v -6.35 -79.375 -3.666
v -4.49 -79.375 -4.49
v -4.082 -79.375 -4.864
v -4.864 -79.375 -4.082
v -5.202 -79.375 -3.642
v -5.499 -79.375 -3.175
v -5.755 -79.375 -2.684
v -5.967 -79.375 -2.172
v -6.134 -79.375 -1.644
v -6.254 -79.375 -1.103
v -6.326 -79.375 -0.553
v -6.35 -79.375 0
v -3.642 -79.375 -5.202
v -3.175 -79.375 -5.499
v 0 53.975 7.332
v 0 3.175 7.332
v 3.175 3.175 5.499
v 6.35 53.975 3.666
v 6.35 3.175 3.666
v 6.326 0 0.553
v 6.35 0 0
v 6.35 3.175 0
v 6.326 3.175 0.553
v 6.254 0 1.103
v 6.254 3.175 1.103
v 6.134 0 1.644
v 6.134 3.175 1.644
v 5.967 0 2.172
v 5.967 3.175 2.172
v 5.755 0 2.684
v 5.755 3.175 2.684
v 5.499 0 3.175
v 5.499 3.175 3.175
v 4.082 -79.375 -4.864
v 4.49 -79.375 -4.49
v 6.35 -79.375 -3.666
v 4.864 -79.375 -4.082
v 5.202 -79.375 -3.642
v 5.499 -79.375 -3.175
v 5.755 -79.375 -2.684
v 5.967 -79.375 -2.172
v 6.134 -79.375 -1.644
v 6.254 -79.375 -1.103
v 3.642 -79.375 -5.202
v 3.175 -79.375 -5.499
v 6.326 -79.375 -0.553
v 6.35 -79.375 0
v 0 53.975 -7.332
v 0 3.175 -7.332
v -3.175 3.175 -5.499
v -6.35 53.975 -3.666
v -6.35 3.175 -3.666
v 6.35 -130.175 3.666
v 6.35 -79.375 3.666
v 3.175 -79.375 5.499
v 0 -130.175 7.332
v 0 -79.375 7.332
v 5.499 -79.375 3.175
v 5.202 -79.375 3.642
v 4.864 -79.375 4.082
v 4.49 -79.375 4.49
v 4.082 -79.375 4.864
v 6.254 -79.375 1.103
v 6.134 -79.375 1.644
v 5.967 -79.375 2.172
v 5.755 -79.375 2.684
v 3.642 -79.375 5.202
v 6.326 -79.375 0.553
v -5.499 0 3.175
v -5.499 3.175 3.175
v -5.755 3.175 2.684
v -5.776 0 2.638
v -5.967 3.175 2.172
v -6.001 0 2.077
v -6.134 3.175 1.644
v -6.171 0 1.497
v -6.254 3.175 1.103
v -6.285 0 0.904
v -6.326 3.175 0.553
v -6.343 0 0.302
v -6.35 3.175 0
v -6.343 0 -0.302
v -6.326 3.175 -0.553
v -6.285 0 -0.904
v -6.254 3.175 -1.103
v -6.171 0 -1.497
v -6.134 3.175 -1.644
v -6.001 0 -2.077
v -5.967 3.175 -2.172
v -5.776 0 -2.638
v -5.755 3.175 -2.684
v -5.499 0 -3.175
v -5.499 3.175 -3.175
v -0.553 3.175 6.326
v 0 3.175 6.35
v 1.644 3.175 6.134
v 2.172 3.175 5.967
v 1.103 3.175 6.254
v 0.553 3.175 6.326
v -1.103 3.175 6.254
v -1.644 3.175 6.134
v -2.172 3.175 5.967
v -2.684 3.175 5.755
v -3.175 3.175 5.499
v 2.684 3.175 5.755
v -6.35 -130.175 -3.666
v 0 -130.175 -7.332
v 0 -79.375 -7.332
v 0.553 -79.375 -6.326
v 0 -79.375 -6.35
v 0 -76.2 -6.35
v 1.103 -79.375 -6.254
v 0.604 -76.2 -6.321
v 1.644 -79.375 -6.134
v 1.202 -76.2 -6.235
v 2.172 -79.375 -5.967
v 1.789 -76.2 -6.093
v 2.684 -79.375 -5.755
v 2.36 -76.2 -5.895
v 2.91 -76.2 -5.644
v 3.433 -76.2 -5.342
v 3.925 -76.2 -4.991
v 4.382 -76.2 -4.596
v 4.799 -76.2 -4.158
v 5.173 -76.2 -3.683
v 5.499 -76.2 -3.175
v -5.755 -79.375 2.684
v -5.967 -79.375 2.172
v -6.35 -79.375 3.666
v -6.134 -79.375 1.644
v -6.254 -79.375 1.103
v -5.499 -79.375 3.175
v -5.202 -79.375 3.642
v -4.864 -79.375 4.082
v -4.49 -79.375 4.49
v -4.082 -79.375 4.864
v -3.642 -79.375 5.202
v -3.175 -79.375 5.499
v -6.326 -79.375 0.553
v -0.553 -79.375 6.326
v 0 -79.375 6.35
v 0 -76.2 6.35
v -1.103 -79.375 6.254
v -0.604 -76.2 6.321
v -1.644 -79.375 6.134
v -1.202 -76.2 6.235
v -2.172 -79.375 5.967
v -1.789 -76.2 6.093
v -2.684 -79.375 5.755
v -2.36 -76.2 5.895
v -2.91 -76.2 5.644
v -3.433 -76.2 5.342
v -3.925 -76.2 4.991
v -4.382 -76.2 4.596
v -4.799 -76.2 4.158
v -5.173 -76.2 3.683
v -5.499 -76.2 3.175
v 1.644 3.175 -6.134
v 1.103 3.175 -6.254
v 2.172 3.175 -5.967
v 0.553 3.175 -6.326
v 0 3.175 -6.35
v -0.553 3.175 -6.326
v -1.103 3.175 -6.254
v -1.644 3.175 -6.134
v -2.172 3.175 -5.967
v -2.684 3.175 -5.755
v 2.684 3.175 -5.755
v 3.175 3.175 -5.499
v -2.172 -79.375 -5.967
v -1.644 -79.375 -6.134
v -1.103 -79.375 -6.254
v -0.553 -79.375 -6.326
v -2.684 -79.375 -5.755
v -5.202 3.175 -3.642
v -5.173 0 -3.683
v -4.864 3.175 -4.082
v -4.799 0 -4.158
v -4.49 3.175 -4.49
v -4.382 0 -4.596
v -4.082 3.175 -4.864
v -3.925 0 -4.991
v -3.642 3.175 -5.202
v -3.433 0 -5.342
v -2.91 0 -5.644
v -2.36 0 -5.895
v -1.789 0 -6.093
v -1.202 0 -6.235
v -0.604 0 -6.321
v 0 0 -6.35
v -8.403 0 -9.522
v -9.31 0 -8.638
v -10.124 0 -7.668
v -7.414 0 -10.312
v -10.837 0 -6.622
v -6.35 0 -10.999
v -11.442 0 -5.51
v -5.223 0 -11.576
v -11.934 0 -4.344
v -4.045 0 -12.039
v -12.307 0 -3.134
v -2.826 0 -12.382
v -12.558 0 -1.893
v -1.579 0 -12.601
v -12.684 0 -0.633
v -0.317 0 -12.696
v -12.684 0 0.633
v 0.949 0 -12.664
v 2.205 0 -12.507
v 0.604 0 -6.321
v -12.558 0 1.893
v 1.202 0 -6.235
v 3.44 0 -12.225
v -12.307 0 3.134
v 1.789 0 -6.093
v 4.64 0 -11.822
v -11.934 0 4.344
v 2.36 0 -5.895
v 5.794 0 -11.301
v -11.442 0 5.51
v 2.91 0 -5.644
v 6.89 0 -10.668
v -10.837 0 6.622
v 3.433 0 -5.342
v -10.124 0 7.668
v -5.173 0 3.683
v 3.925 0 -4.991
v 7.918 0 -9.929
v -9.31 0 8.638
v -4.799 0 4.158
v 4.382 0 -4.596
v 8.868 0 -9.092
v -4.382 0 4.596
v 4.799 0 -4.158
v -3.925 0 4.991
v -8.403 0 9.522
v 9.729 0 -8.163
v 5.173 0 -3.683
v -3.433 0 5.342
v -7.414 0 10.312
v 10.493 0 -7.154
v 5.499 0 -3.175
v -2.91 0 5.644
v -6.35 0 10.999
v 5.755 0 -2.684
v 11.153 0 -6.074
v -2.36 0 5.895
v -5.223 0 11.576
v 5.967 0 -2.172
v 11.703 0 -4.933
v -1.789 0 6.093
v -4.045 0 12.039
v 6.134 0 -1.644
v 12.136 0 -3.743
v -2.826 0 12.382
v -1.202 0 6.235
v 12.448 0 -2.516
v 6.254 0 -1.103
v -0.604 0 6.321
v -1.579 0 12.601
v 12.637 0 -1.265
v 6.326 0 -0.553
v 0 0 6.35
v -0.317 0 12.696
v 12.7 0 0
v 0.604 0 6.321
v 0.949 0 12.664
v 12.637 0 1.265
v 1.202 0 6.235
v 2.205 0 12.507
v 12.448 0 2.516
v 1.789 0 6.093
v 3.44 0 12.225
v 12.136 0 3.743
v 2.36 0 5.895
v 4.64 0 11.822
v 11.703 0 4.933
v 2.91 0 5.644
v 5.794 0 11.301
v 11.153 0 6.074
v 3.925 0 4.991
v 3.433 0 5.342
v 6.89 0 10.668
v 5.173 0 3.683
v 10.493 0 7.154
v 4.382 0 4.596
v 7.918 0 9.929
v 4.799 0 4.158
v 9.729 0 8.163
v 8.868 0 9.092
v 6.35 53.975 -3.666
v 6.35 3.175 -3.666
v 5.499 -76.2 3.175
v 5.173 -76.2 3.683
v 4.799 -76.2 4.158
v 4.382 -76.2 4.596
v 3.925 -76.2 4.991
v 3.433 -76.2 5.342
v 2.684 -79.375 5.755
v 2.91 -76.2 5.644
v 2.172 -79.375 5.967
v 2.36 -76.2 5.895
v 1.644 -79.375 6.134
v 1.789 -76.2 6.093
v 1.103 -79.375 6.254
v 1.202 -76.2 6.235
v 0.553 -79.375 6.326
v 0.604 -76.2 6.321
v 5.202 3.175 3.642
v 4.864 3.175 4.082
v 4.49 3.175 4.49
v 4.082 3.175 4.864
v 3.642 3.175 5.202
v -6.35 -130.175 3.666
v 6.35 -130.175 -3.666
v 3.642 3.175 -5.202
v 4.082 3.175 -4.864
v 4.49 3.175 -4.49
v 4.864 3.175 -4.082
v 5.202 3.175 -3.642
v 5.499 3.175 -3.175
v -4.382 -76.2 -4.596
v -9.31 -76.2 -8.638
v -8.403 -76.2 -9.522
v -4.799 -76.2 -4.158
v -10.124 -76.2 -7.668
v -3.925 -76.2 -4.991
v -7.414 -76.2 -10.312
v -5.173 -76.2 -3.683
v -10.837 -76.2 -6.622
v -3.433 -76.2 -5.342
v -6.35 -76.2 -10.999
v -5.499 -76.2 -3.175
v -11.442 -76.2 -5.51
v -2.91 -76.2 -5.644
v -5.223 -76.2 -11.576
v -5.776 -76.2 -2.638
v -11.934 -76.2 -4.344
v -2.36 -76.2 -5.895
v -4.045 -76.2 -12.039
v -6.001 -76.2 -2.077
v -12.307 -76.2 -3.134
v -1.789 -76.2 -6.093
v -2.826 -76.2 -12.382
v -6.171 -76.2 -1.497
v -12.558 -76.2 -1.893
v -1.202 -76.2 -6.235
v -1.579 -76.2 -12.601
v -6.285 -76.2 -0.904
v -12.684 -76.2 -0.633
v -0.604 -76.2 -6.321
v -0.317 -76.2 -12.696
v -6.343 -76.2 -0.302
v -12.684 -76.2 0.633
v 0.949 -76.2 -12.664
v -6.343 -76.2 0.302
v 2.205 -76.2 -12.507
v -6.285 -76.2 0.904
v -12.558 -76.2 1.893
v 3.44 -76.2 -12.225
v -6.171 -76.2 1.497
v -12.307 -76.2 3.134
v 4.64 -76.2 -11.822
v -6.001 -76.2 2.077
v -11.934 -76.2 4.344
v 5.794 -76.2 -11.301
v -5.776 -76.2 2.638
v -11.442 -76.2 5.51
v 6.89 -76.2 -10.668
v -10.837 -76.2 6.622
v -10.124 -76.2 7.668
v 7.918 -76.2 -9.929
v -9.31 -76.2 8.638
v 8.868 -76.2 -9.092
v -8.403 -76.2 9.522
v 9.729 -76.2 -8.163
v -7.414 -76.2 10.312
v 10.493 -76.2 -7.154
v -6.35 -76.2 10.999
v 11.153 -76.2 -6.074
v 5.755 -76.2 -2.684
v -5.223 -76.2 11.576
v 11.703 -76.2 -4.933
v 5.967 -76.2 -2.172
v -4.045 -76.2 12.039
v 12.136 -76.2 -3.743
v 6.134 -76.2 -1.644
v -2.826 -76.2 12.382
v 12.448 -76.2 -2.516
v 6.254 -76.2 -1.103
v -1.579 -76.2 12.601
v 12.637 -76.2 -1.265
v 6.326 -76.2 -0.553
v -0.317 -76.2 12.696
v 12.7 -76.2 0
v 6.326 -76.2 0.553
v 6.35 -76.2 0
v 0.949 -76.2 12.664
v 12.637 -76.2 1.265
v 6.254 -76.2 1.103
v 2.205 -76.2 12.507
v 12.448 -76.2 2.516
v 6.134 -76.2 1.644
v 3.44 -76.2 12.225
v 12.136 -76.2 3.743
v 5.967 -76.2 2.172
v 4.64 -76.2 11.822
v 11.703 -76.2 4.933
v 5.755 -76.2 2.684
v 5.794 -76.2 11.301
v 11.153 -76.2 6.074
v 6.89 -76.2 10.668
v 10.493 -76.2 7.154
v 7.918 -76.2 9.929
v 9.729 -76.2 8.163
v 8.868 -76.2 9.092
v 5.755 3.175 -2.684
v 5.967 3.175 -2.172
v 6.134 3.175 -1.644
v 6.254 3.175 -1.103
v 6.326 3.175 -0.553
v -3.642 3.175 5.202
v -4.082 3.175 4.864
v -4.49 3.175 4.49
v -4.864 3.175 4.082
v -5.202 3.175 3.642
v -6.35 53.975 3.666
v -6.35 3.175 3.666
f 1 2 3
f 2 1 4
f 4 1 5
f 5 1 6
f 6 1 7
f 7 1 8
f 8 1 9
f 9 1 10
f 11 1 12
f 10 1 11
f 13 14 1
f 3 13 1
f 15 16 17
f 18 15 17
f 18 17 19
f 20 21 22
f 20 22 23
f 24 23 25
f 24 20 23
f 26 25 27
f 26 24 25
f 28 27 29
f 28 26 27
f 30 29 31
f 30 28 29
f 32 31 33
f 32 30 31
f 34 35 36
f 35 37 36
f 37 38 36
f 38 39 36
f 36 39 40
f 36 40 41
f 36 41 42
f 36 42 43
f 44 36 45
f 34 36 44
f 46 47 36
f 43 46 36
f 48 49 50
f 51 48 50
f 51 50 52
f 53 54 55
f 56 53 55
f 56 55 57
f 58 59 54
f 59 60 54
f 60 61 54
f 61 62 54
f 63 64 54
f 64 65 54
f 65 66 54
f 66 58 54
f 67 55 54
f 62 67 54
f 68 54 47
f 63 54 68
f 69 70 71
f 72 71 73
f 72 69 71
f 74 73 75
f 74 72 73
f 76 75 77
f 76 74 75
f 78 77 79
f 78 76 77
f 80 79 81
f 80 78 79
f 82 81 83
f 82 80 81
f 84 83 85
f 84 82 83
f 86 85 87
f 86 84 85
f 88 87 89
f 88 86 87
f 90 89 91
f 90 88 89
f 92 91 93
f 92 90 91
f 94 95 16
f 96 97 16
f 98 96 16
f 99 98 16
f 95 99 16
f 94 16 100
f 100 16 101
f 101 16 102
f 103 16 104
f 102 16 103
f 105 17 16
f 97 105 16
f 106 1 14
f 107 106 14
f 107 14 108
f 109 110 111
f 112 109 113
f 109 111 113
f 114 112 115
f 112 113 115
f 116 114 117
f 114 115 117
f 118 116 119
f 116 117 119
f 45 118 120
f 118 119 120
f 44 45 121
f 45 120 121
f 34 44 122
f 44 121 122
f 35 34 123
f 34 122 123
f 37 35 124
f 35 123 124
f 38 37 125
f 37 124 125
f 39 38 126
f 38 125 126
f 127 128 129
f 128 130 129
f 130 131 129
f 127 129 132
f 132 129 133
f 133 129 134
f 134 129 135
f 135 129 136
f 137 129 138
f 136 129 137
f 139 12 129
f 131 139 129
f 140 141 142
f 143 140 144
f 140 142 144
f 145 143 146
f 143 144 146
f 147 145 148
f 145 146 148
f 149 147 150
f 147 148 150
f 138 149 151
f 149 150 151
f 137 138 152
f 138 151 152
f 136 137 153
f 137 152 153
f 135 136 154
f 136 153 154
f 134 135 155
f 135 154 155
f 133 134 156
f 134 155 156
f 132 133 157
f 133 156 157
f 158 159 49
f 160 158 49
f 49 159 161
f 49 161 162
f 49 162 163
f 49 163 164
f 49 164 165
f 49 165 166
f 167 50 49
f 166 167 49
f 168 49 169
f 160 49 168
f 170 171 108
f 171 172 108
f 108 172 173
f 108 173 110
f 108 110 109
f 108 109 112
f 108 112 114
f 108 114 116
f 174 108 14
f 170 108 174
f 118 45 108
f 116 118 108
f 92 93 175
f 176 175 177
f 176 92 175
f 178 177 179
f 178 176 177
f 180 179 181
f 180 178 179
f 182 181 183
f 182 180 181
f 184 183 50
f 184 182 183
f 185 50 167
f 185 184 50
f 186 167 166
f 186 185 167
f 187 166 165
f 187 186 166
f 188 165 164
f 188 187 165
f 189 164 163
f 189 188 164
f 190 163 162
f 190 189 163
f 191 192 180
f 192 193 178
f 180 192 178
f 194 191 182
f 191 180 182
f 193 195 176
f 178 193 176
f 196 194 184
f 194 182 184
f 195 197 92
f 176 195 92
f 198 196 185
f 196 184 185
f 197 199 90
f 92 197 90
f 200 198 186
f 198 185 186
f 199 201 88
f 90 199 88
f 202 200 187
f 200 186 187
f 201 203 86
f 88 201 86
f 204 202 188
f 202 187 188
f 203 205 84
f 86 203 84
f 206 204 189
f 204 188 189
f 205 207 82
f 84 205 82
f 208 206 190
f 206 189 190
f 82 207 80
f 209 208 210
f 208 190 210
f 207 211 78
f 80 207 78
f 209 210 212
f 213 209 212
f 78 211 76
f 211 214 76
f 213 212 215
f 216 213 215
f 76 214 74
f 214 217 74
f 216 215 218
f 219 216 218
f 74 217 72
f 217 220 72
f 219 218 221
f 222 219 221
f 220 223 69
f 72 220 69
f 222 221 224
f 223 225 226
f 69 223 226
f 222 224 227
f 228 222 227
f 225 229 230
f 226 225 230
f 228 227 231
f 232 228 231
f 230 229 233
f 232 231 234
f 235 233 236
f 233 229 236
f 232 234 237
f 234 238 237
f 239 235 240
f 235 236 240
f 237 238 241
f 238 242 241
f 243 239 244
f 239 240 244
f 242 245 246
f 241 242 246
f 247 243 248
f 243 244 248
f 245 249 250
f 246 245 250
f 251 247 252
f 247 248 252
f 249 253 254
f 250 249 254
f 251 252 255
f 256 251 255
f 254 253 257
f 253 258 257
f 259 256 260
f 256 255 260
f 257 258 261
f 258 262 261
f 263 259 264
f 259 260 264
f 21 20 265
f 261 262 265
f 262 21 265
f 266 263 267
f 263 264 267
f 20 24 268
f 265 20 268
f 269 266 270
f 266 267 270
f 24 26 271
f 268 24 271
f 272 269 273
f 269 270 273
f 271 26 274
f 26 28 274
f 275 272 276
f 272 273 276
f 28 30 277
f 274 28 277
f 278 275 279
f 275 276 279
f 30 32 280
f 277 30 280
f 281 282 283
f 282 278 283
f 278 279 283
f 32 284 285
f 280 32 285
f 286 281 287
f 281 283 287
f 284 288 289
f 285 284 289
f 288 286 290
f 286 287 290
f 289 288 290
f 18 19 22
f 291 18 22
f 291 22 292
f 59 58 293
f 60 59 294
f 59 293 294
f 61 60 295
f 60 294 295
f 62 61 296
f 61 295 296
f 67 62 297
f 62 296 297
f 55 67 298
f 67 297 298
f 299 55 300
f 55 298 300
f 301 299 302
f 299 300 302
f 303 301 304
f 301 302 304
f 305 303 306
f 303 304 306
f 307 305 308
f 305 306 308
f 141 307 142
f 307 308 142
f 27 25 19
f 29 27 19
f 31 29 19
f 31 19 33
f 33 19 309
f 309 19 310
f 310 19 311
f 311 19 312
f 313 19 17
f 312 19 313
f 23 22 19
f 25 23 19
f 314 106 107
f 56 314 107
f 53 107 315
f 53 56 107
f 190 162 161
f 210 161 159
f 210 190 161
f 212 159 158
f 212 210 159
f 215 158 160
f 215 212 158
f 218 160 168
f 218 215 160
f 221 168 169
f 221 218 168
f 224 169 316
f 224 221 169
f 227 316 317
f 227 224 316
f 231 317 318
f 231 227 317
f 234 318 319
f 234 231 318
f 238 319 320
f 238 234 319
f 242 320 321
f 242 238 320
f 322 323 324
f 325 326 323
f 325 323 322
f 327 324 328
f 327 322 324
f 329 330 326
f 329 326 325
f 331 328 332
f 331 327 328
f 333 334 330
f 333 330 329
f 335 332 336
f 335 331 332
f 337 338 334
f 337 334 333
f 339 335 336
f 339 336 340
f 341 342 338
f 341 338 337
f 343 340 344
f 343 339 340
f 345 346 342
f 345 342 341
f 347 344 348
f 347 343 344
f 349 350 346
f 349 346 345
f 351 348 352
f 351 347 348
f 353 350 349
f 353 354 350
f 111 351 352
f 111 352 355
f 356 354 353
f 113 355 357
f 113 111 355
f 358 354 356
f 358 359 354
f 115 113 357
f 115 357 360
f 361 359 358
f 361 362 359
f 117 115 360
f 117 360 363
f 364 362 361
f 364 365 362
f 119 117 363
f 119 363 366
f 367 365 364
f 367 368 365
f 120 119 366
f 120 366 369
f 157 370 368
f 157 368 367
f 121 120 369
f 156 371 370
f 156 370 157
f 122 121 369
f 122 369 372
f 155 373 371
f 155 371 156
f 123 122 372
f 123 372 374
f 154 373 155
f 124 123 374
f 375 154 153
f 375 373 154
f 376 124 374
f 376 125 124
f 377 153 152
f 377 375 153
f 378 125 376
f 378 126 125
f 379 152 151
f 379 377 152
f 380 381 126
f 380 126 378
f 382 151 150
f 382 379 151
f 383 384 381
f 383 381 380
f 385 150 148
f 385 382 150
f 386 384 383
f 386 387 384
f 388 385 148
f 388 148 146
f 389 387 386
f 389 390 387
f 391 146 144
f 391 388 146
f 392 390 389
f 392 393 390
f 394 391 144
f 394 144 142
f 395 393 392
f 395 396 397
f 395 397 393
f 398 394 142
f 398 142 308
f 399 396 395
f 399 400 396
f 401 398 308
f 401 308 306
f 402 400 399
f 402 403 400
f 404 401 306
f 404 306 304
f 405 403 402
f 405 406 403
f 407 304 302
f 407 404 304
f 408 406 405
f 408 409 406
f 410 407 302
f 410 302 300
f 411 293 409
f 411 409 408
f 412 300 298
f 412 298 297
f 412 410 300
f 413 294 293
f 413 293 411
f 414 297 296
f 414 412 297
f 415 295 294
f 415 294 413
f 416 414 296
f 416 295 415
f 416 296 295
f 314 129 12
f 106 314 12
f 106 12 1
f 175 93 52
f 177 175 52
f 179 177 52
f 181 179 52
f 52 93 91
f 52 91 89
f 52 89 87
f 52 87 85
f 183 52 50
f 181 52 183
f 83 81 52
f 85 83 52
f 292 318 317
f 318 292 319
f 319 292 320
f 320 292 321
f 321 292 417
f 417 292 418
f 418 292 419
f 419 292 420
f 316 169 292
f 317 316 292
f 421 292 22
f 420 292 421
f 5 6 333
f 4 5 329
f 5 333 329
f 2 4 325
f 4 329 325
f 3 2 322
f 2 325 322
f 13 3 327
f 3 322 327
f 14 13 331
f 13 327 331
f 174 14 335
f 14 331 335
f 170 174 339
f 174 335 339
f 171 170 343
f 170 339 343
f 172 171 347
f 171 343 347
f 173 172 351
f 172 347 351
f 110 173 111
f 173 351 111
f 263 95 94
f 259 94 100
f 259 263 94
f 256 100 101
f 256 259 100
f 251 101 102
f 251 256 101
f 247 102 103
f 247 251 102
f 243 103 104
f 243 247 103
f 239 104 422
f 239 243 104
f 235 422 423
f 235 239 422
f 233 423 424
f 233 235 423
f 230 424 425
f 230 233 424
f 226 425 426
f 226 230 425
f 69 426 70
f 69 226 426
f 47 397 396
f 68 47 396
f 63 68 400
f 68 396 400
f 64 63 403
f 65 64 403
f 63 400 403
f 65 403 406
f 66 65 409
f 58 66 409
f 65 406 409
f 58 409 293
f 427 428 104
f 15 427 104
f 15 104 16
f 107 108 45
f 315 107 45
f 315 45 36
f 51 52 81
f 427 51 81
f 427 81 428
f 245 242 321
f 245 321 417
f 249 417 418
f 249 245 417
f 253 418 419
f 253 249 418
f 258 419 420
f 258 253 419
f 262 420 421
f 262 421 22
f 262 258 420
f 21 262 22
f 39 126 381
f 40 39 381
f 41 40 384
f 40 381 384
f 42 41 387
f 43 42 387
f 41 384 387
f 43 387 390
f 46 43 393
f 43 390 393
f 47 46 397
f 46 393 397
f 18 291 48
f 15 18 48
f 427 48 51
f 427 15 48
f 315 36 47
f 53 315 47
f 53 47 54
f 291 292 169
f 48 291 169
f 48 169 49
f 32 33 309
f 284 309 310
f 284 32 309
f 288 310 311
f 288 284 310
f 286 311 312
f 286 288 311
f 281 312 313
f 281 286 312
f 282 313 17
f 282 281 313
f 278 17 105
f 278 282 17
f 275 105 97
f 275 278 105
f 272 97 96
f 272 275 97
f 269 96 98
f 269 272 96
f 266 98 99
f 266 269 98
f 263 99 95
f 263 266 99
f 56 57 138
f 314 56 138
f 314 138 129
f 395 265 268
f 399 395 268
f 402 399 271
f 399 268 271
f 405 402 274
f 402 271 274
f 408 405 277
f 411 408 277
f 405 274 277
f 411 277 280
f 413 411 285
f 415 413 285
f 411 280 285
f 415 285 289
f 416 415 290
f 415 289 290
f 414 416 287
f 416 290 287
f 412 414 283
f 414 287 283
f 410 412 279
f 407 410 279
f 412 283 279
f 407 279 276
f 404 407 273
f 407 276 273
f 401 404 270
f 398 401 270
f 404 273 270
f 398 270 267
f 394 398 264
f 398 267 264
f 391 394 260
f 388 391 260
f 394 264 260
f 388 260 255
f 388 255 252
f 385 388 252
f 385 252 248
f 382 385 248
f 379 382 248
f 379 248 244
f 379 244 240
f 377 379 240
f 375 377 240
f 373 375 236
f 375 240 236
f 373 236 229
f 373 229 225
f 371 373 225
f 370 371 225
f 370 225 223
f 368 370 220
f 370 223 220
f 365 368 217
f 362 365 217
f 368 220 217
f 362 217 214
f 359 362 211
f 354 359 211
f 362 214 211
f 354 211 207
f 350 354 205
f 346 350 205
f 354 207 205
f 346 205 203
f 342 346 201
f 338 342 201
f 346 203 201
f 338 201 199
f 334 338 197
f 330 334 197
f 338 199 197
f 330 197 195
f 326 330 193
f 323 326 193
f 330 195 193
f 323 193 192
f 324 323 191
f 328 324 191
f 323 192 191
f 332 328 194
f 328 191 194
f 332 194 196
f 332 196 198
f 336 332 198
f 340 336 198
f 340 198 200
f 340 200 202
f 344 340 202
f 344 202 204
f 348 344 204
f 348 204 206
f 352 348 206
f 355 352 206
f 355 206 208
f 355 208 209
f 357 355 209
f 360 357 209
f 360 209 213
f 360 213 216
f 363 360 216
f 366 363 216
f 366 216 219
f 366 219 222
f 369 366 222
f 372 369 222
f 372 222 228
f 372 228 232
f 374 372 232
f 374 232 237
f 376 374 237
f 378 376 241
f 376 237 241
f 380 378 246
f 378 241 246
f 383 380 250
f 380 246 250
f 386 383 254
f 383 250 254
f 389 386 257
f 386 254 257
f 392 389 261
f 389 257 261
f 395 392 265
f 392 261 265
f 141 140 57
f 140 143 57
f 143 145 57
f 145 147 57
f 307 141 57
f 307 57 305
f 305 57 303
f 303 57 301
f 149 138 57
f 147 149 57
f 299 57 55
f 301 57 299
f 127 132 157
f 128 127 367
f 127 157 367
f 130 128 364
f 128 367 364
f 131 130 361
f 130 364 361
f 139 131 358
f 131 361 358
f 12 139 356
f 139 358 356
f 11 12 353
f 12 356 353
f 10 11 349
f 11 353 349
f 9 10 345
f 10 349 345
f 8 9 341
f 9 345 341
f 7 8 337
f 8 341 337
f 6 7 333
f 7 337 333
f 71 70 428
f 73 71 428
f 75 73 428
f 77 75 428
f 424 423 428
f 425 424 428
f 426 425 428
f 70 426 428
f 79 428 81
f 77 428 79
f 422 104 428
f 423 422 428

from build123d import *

# Parameters (mm, degrees)
F0_R          = 12.7
F1_DEPTH      = 76.2
F2_DEPTH      = 79.375
F2_DEPTH_BACK = 3.175
F4_DEPTH      = 50.8
F6_DEPTH      = 50.8


with BuildPart() as f1:
    # F0 (on Front) → F1 (new body)
    with BuildSketch(Plane.XZ):
        Circle(F0_R)
        Polygon((3.6661742094, 6.35), (5.499261351, 3.174999936), (7.3323484187, 0), (5.4992613448, -3.1749999467), (3.6661742094, -6.35), (0, -6.35), (-3.6661742094, -6.35), (-5.4992613166, -3.1749999956), (-7.3323484187, 0), (-5.4992612953, 3.1750000324), (-3.6661742094, 6.35), (0, 6.35), align=None, mode=Mode.SUBTRACT)
        with BuildLine():
            ThreePointArc((0, 6.35), (3.175000032, 5.4992612955), (5.499261351, 3.174999936))
            Line((5.499261351, 3.174999936), (3.6661742094, 6.35))
            Line((3.6661742094, 6.35), (0, 6.35))
        make_face()
        with BuildLine():
            ThreePointArc((5.499261351, 3.174999936), (6.1336290065, 1.6435009007), (6.35, 0))
            ThreePointArc((6.35, 0), (6.1336290049, -1.6435009067), (5.4992613448, -3.1749999467))
            Line((5.4992613448, -3.1749999467), (7.3323484187, 0))
            Line((7.3323484187, 0), (5.499261351, 3.174999936))
        make_face()
        with BuildLine():
            ThreePointArc((-5.4992612953, 3.1750000324), (-3.1749999838, 5.4992613234), (0, 6.35))
            Line((0, 6.35), (-3.6661742094, 6.35))
            Line((-3.6661742094, 6.35), (-5.4992612953, 3.1750000324))
        make_face()
        with BuildLine():
            ThreePointArc((-5.4992613166, -3.1749999956), (-6.35, 2.13e-08), (-5.4992612953, 3.1750000324))
            Line((-5.4992612953, 3.1750000324), (-7.3323484187, 0))
            Line((-7.3323484187, 0), (-5.4992613166, -3.1749999956))
        make_face()
        with BuildLine():
            Line((-3.6661742094, -6.35), (0, -6.35))
            ThreePointArc((0, -6.35), (-3.1750000022, -5.4992613128), (-5.4992613166, -3.1749999956))
            Line((-5.4992613166, -3.1749999956), (-3.6661742094, -6.35))
        make_face()
        with BuildLine():
            Line((3.6661742094, -6.35), (5.4992613448, -3.1749999467))
            ThreePointArc((5.4992613448, -3.1749999467), (3.1750000266, -5.4992612987), (0, -6.35))
            Line((0, -6.35), (3.6661742094, -6.35))
        make_face()
    extrude(amount=F1_DEPTH)

    # F0 (on Front) → F2 (join, two sides)
    with BuildSketch(Plane.XZ) as f2_sk:
        with BuildLine():
            ThreePointArc((5.4992613448, -3.1749999467), (6.1336290049, -1.6435009067), (6.35, 0))
            ThreePointArc((6.35, 0), (6.1336290065, 1.6435009007), (5.499261351, 3.174999936))
            ThreePointArc((5.499261351, 3.174999936), (3.175000032, 5.4992612955), (0, 6.35))
            ThreePointArc((0, 6.35), (-3.1749999838, 5.4992613234), (-5.4992612953, 3.1750000324))
            ThreePointArc((-5.4992612953, 3.1750000324), (-6.35, 2.13e-08), (-5.4992613166, -3.1749999956))
            ThreePointArc((-5.4992613166, -3.1749999956), (-3.1750000022, -5.4992613128), (0, -6.35))
            ThreePointArc((0, -6.35), (3.1750000266, -5.4992612987), (5.4992613448, -3.1749999467))
        make_face()
    extrude(amount=F2_DEPTH)
    extrude(f2_sk.sketch, amount=-F2_DEPTH_BACK)

    # F3 (on face) → F4 (join)
    with BuildSketch(Plane(origin=(0, 3.175, 0), x_dir=(-1, 0, 0), z_dir=(0, 1, 0))):
        Polygon((6.35, -3.6661742094), (6.35, 3.6661742094), (0, 7.3323484187), (-6.35, 3.6661742094), (-6.35, -3.6661742094), (0, -7.3323484187), align=None)
    extrude(amount=F4_DEPTH)

    # F5 (on face) → F6 (join)
    with BuildSketch(Plane.XZ.offset(79.375)):
        Polygon((-6.35, 3.6661742094), (-6.35, -3.6661742094), (0, -7.3323484187), (6.35, -3.6661742094), (6.35, 3.6661742094), (0, 7.3323484187), align=None)
    extrude(amount=F6_DEPTH)


solid = f1.part
